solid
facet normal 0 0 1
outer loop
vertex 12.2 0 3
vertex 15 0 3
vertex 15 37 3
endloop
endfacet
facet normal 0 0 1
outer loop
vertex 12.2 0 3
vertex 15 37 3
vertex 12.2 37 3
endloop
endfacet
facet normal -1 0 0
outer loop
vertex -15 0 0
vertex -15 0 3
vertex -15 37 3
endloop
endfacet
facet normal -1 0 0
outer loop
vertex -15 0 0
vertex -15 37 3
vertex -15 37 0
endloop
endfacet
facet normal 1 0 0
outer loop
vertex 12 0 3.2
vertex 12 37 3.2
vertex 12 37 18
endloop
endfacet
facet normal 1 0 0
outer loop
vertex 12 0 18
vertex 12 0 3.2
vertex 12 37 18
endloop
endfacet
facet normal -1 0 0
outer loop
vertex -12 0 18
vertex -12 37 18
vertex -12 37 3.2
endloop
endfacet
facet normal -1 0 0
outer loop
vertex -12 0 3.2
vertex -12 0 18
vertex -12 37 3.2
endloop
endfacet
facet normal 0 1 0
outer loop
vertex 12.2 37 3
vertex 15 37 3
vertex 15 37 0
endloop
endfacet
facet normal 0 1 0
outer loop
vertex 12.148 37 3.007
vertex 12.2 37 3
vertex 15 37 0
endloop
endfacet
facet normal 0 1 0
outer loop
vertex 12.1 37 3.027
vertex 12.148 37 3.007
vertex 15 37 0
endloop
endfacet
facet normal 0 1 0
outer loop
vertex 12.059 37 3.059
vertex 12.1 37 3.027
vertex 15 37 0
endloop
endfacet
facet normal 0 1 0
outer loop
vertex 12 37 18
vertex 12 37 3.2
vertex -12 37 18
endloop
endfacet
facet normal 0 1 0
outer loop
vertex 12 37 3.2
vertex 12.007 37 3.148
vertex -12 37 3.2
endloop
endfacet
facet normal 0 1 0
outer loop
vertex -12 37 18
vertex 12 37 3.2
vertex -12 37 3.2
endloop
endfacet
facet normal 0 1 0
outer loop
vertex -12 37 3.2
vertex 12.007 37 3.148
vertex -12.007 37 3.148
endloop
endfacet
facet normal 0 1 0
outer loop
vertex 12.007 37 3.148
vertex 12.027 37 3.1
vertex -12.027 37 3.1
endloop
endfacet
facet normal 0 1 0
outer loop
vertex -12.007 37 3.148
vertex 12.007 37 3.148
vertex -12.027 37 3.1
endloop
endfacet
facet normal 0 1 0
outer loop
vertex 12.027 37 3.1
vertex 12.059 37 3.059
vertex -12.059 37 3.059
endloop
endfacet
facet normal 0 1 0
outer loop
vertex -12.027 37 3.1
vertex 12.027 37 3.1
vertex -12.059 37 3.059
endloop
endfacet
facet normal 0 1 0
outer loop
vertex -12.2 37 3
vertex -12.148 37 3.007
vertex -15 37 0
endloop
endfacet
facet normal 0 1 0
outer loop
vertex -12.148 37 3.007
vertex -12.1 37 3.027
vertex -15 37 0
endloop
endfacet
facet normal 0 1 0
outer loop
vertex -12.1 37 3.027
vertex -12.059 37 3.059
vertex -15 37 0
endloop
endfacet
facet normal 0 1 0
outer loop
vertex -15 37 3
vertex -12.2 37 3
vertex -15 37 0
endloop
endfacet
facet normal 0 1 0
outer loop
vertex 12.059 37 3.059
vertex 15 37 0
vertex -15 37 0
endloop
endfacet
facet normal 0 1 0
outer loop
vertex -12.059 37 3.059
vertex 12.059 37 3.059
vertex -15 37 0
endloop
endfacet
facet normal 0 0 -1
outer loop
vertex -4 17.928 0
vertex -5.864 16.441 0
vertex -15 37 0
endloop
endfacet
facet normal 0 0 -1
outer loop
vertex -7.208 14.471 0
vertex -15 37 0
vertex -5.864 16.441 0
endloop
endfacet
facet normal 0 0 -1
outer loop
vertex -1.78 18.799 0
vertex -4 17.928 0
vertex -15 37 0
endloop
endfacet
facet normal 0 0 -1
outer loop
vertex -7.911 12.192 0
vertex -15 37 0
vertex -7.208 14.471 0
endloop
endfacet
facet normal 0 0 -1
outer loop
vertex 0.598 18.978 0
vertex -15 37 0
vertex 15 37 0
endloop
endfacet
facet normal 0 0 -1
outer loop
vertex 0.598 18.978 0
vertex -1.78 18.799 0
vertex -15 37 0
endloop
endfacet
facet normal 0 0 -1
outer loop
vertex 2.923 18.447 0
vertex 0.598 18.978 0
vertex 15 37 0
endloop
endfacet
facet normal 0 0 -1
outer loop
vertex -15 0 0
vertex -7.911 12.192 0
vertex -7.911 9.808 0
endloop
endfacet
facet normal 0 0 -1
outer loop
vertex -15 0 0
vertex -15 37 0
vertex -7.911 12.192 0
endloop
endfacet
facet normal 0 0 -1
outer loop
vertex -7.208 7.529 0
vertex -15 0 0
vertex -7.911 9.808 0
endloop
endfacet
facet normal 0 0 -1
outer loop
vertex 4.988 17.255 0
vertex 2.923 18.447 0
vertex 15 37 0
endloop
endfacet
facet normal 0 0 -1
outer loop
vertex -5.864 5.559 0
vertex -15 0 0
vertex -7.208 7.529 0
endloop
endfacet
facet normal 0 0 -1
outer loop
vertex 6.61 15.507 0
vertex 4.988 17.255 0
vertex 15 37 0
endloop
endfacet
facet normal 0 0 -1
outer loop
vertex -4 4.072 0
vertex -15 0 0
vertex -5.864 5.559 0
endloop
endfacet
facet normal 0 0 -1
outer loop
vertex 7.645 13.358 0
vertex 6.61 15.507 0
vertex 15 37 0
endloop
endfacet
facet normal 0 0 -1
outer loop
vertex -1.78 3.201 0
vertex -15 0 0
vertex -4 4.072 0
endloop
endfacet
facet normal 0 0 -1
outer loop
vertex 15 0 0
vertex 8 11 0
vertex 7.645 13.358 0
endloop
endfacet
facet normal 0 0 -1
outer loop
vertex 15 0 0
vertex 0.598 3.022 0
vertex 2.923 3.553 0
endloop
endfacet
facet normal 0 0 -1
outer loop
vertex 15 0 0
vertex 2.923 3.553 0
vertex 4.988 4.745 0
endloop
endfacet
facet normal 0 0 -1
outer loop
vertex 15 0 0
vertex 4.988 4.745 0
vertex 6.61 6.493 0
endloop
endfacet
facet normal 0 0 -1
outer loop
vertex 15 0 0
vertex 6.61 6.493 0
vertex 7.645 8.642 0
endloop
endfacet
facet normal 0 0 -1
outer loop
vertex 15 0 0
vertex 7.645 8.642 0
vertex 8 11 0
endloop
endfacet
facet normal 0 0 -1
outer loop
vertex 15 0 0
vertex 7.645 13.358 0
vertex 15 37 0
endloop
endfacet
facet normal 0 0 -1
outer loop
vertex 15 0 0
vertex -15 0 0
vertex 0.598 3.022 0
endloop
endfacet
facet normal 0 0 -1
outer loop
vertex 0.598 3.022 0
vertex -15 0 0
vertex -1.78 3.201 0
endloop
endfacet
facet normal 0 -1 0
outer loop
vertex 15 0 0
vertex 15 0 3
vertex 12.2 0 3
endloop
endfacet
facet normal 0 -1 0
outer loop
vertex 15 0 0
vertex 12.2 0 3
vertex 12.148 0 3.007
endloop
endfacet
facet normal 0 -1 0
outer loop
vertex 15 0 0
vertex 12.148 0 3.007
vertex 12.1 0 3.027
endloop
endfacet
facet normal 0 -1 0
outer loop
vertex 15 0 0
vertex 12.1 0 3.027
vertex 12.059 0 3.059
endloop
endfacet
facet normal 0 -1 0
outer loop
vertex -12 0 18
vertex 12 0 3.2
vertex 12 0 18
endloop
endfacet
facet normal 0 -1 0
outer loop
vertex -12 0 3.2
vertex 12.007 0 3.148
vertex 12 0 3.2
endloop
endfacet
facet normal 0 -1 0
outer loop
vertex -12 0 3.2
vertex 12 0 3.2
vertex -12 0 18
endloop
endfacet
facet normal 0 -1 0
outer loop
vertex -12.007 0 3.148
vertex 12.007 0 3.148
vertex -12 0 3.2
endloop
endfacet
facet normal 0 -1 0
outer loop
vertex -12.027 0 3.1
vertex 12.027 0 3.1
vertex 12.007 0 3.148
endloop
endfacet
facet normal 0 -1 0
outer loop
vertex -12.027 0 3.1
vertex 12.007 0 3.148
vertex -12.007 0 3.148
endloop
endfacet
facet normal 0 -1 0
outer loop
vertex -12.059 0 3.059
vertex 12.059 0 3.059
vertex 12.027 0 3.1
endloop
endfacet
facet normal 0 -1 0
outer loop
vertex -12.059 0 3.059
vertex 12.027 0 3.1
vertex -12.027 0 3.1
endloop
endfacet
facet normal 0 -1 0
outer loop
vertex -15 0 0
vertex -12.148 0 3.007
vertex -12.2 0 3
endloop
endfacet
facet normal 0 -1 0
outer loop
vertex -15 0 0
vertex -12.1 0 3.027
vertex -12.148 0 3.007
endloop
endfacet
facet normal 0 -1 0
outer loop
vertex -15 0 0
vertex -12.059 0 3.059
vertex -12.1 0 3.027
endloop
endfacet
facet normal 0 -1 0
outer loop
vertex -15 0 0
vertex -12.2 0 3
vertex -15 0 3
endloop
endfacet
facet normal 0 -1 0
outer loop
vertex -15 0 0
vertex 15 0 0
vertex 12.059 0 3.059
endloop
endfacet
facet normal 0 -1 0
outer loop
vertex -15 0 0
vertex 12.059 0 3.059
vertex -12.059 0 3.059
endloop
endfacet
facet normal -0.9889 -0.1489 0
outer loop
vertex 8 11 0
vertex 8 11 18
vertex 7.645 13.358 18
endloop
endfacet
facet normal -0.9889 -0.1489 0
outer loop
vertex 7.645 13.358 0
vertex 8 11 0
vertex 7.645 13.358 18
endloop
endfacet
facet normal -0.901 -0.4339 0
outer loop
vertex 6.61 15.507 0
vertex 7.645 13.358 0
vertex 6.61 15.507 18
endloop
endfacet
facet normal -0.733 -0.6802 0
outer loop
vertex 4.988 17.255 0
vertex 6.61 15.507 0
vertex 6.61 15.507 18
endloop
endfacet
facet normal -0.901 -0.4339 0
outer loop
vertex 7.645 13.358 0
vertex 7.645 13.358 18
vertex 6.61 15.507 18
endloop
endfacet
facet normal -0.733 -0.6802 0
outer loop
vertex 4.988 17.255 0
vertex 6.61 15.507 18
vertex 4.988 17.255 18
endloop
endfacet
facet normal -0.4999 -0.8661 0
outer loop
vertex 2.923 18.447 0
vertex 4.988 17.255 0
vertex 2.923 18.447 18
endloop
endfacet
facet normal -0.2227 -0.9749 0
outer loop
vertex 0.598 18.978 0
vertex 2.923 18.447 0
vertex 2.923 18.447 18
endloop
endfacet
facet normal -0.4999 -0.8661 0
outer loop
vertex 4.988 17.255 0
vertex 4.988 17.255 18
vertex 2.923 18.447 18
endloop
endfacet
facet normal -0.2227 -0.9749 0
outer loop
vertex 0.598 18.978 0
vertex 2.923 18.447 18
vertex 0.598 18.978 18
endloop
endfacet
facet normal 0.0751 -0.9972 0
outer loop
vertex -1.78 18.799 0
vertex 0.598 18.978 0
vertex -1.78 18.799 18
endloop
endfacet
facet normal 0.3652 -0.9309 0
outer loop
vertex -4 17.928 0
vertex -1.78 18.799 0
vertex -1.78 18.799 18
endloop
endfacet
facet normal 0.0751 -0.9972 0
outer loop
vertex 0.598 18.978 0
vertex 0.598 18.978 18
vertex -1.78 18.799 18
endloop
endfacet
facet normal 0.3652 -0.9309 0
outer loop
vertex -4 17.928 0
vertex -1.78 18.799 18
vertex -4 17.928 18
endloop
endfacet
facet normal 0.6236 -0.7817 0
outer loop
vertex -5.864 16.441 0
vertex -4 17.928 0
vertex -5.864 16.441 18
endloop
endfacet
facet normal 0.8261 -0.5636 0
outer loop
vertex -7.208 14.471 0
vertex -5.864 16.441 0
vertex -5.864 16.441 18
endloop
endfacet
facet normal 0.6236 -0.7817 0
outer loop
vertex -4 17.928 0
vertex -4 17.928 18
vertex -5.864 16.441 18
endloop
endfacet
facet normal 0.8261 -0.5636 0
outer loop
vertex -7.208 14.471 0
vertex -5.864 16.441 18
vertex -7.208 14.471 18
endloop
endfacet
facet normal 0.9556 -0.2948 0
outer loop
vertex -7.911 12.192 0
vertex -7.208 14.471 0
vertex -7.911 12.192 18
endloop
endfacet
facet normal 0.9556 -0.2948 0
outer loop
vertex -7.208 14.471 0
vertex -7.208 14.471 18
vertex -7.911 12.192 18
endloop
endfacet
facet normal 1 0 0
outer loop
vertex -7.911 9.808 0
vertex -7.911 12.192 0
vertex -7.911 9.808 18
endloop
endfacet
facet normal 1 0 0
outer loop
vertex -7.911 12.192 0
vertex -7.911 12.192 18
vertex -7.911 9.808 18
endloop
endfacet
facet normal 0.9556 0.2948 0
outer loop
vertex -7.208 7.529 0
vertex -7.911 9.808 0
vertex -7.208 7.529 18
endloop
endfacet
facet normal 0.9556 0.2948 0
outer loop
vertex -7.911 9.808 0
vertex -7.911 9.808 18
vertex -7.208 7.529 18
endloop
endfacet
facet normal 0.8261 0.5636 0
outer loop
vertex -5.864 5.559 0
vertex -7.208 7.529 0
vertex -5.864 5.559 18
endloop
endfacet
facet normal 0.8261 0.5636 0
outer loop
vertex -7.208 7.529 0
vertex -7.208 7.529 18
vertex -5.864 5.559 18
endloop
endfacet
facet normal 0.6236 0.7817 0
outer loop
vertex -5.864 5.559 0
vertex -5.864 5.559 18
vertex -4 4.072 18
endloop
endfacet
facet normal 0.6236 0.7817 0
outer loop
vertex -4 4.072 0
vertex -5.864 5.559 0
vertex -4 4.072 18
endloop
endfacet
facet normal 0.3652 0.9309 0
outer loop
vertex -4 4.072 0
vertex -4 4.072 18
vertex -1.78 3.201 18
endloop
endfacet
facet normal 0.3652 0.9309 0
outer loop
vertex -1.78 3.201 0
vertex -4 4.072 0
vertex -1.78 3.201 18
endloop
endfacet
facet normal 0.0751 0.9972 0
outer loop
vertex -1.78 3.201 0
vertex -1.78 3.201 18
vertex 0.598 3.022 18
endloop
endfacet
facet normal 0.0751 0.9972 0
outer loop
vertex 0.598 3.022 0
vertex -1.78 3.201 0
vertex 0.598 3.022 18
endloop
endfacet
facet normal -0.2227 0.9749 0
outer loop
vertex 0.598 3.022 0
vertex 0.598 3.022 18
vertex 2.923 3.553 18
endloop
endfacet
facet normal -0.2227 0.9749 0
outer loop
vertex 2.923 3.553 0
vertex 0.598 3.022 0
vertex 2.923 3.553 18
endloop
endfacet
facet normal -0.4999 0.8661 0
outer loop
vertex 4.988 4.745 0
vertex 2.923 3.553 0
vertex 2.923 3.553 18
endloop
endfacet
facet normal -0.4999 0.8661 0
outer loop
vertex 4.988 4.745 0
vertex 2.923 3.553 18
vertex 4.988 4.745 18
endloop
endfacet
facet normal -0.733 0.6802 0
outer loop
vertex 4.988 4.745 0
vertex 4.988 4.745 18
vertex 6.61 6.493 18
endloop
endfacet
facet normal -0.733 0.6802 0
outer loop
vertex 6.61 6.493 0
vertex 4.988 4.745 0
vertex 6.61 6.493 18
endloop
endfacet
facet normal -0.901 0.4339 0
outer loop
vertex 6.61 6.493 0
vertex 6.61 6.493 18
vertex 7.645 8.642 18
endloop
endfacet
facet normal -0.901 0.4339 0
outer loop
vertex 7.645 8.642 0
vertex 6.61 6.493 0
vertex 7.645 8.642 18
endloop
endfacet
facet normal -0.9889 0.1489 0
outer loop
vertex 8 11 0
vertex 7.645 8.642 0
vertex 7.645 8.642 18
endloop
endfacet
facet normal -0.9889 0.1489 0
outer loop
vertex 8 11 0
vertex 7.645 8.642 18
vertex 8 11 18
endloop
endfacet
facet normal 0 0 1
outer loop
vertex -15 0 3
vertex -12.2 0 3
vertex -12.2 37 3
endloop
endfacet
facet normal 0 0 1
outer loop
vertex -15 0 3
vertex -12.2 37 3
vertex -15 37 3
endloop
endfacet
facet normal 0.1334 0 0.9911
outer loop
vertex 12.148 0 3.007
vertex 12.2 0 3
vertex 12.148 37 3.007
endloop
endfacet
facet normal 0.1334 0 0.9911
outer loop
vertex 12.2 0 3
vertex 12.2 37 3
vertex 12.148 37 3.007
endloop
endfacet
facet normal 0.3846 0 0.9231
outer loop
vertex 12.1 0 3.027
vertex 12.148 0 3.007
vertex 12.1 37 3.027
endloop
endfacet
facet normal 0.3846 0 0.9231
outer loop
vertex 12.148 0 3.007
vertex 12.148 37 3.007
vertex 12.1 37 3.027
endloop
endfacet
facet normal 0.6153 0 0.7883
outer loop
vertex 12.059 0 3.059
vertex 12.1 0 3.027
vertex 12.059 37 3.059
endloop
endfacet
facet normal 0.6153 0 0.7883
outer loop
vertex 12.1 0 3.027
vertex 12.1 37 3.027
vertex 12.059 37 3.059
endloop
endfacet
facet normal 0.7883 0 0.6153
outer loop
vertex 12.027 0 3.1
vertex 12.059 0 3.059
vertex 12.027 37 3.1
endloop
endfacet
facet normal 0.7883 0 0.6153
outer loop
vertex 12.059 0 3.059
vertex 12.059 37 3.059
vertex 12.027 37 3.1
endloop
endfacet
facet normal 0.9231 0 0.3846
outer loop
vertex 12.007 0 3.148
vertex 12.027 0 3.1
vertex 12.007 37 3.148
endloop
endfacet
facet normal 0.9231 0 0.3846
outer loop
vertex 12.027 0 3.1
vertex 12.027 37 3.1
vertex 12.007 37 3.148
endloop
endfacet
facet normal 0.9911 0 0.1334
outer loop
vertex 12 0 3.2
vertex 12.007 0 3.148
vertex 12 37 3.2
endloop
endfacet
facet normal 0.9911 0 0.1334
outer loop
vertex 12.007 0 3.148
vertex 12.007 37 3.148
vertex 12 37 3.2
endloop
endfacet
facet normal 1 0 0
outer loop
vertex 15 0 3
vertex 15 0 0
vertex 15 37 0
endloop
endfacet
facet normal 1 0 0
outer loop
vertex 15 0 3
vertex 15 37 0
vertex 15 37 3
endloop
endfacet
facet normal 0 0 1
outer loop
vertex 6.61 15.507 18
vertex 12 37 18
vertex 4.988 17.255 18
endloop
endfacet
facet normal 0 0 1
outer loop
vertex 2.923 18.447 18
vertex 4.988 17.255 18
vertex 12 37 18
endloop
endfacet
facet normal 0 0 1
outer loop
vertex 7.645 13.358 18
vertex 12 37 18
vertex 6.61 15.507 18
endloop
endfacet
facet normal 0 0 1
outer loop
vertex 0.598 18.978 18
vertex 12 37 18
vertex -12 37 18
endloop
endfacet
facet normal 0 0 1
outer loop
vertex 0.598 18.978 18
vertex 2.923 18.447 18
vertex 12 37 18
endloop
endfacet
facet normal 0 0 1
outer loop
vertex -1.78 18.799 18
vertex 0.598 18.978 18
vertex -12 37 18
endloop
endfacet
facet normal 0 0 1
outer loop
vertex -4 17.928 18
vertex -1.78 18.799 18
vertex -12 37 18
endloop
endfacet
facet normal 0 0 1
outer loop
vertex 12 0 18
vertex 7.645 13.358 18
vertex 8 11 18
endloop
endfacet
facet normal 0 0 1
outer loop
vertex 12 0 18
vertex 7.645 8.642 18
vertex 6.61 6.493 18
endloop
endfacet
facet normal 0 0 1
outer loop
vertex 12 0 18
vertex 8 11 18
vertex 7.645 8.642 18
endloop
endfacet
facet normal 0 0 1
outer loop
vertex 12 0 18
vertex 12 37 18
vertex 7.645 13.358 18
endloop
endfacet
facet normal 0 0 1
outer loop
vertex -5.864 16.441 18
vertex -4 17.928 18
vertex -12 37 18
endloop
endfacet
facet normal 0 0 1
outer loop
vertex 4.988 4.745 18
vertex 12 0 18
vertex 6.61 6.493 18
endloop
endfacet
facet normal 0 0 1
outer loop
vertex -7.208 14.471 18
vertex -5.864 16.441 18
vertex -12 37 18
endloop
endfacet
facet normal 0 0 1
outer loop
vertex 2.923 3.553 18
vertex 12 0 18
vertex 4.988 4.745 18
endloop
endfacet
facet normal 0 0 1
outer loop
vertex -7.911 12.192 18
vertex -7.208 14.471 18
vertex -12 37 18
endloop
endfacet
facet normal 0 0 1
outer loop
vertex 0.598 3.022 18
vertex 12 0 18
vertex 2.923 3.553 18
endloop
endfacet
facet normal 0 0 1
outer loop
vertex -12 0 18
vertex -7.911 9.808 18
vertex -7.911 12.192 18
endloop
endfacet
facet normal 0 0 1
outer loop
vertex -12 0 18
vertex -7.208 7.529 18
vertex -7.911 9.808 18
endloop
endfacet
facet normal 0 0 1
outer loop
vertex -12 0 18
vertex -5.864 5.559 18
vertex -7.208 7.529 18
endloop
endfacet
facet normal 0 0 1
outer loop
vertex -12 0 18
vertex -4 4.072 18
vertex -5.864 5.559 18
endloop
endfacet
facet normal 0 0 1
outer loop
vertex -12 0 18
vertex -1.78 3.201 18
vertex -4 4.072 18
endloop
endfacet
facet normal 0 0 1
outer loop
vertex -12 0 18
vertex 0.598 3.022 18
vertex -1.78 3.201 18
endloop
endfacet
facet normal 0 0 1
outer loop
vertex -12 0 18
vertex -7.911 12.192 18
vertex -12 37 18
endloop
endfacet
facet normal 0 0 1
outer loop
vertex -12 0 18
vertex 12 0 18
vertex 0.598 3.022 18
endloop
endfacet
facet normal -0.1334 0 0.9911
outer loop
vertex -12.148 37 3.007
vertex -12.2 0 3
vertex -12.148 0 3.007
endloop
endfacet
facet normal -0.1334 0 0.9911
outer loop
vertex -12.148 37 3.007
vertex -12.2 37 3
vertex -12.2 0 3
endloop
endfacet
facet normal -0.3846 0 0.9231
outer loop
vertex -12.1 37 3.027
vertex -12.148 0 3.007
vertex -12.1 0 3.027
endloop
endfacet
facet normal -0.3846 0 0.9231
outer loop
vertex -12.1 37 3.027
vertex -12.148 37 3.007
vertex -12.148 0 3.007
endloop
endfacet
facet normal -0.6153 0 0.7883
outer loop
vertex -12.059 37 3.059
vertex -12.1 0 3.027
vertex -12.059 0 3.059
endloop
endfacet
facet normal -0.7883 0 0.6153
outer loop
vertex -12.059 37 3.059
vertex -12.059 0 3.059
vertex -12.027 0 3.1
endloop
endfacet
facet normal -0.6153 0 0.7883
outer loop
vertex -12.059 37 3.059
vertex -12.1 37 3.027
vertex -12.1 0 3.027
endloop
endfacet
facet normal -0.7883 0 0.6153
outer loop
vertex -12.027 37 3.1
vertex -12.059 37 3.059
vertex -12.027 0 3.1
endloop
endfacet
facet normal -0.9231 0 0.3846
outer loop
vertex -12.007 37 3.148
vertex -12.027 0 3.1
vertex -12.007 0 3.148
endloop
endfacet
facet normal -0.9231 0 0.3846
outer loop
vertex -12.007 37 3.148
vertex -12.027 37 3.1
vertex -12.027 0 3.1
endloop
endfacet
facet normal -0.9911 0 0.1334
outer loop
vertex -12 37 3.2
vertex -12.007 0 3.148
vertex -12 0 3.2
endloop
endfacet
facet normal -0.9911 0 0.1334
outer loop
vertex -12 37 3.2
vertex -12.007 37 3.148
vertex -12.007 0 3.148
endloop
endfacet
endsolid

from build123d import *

# Parameters (mm, degrees)
ESTRUSIONE_ESTRUSIONE1_DEPTH = 37
SCHIZZO4_R                   = 8
TAGLIO_ESTRUSIONE1_DEPTH     = 44.794976881
RACCORDO1_R                  = 0.2


with BuildPart() as part:
    # Schizzo1 → Estrusione-Estrusione1 (new body)
    with BuildSketch(Plane(origin=(0, 0, 0), x_dir=(1, 0, 0), z_dir=(0, 1, 0))):
        Polygon((-15, 0), (15, 0), (15, -3), (12, -3), (12, -18), (-12, -18), (-12, -3), (-15, -3), align=None)
    extrude(amount=ESTRUSIONE_ESTRUSIONE1_DEPTH)

    # Schizzo4 → Taglio-Estrusione1 (cut, through all)
    with BuildSketch(Plane.XY.offset(18)):
        with Locations((0, 11)):
            Circle(SCHIZZO4_R)
    extrude(amount=-TAGLIO_ESTRUSIONE1_DEPTH, mode=Mode.SUBTRACT)

    # Raccordo1
    raccordo1_edges = [part.edges().sort_by_distance(p)[0] for p in [
        (12, 18.5, 3),
        (-12, 18.5, 3),
    ]]
    fillet(raccordo1_edges, radius=RACCORDO1_R)


solid = part.part
